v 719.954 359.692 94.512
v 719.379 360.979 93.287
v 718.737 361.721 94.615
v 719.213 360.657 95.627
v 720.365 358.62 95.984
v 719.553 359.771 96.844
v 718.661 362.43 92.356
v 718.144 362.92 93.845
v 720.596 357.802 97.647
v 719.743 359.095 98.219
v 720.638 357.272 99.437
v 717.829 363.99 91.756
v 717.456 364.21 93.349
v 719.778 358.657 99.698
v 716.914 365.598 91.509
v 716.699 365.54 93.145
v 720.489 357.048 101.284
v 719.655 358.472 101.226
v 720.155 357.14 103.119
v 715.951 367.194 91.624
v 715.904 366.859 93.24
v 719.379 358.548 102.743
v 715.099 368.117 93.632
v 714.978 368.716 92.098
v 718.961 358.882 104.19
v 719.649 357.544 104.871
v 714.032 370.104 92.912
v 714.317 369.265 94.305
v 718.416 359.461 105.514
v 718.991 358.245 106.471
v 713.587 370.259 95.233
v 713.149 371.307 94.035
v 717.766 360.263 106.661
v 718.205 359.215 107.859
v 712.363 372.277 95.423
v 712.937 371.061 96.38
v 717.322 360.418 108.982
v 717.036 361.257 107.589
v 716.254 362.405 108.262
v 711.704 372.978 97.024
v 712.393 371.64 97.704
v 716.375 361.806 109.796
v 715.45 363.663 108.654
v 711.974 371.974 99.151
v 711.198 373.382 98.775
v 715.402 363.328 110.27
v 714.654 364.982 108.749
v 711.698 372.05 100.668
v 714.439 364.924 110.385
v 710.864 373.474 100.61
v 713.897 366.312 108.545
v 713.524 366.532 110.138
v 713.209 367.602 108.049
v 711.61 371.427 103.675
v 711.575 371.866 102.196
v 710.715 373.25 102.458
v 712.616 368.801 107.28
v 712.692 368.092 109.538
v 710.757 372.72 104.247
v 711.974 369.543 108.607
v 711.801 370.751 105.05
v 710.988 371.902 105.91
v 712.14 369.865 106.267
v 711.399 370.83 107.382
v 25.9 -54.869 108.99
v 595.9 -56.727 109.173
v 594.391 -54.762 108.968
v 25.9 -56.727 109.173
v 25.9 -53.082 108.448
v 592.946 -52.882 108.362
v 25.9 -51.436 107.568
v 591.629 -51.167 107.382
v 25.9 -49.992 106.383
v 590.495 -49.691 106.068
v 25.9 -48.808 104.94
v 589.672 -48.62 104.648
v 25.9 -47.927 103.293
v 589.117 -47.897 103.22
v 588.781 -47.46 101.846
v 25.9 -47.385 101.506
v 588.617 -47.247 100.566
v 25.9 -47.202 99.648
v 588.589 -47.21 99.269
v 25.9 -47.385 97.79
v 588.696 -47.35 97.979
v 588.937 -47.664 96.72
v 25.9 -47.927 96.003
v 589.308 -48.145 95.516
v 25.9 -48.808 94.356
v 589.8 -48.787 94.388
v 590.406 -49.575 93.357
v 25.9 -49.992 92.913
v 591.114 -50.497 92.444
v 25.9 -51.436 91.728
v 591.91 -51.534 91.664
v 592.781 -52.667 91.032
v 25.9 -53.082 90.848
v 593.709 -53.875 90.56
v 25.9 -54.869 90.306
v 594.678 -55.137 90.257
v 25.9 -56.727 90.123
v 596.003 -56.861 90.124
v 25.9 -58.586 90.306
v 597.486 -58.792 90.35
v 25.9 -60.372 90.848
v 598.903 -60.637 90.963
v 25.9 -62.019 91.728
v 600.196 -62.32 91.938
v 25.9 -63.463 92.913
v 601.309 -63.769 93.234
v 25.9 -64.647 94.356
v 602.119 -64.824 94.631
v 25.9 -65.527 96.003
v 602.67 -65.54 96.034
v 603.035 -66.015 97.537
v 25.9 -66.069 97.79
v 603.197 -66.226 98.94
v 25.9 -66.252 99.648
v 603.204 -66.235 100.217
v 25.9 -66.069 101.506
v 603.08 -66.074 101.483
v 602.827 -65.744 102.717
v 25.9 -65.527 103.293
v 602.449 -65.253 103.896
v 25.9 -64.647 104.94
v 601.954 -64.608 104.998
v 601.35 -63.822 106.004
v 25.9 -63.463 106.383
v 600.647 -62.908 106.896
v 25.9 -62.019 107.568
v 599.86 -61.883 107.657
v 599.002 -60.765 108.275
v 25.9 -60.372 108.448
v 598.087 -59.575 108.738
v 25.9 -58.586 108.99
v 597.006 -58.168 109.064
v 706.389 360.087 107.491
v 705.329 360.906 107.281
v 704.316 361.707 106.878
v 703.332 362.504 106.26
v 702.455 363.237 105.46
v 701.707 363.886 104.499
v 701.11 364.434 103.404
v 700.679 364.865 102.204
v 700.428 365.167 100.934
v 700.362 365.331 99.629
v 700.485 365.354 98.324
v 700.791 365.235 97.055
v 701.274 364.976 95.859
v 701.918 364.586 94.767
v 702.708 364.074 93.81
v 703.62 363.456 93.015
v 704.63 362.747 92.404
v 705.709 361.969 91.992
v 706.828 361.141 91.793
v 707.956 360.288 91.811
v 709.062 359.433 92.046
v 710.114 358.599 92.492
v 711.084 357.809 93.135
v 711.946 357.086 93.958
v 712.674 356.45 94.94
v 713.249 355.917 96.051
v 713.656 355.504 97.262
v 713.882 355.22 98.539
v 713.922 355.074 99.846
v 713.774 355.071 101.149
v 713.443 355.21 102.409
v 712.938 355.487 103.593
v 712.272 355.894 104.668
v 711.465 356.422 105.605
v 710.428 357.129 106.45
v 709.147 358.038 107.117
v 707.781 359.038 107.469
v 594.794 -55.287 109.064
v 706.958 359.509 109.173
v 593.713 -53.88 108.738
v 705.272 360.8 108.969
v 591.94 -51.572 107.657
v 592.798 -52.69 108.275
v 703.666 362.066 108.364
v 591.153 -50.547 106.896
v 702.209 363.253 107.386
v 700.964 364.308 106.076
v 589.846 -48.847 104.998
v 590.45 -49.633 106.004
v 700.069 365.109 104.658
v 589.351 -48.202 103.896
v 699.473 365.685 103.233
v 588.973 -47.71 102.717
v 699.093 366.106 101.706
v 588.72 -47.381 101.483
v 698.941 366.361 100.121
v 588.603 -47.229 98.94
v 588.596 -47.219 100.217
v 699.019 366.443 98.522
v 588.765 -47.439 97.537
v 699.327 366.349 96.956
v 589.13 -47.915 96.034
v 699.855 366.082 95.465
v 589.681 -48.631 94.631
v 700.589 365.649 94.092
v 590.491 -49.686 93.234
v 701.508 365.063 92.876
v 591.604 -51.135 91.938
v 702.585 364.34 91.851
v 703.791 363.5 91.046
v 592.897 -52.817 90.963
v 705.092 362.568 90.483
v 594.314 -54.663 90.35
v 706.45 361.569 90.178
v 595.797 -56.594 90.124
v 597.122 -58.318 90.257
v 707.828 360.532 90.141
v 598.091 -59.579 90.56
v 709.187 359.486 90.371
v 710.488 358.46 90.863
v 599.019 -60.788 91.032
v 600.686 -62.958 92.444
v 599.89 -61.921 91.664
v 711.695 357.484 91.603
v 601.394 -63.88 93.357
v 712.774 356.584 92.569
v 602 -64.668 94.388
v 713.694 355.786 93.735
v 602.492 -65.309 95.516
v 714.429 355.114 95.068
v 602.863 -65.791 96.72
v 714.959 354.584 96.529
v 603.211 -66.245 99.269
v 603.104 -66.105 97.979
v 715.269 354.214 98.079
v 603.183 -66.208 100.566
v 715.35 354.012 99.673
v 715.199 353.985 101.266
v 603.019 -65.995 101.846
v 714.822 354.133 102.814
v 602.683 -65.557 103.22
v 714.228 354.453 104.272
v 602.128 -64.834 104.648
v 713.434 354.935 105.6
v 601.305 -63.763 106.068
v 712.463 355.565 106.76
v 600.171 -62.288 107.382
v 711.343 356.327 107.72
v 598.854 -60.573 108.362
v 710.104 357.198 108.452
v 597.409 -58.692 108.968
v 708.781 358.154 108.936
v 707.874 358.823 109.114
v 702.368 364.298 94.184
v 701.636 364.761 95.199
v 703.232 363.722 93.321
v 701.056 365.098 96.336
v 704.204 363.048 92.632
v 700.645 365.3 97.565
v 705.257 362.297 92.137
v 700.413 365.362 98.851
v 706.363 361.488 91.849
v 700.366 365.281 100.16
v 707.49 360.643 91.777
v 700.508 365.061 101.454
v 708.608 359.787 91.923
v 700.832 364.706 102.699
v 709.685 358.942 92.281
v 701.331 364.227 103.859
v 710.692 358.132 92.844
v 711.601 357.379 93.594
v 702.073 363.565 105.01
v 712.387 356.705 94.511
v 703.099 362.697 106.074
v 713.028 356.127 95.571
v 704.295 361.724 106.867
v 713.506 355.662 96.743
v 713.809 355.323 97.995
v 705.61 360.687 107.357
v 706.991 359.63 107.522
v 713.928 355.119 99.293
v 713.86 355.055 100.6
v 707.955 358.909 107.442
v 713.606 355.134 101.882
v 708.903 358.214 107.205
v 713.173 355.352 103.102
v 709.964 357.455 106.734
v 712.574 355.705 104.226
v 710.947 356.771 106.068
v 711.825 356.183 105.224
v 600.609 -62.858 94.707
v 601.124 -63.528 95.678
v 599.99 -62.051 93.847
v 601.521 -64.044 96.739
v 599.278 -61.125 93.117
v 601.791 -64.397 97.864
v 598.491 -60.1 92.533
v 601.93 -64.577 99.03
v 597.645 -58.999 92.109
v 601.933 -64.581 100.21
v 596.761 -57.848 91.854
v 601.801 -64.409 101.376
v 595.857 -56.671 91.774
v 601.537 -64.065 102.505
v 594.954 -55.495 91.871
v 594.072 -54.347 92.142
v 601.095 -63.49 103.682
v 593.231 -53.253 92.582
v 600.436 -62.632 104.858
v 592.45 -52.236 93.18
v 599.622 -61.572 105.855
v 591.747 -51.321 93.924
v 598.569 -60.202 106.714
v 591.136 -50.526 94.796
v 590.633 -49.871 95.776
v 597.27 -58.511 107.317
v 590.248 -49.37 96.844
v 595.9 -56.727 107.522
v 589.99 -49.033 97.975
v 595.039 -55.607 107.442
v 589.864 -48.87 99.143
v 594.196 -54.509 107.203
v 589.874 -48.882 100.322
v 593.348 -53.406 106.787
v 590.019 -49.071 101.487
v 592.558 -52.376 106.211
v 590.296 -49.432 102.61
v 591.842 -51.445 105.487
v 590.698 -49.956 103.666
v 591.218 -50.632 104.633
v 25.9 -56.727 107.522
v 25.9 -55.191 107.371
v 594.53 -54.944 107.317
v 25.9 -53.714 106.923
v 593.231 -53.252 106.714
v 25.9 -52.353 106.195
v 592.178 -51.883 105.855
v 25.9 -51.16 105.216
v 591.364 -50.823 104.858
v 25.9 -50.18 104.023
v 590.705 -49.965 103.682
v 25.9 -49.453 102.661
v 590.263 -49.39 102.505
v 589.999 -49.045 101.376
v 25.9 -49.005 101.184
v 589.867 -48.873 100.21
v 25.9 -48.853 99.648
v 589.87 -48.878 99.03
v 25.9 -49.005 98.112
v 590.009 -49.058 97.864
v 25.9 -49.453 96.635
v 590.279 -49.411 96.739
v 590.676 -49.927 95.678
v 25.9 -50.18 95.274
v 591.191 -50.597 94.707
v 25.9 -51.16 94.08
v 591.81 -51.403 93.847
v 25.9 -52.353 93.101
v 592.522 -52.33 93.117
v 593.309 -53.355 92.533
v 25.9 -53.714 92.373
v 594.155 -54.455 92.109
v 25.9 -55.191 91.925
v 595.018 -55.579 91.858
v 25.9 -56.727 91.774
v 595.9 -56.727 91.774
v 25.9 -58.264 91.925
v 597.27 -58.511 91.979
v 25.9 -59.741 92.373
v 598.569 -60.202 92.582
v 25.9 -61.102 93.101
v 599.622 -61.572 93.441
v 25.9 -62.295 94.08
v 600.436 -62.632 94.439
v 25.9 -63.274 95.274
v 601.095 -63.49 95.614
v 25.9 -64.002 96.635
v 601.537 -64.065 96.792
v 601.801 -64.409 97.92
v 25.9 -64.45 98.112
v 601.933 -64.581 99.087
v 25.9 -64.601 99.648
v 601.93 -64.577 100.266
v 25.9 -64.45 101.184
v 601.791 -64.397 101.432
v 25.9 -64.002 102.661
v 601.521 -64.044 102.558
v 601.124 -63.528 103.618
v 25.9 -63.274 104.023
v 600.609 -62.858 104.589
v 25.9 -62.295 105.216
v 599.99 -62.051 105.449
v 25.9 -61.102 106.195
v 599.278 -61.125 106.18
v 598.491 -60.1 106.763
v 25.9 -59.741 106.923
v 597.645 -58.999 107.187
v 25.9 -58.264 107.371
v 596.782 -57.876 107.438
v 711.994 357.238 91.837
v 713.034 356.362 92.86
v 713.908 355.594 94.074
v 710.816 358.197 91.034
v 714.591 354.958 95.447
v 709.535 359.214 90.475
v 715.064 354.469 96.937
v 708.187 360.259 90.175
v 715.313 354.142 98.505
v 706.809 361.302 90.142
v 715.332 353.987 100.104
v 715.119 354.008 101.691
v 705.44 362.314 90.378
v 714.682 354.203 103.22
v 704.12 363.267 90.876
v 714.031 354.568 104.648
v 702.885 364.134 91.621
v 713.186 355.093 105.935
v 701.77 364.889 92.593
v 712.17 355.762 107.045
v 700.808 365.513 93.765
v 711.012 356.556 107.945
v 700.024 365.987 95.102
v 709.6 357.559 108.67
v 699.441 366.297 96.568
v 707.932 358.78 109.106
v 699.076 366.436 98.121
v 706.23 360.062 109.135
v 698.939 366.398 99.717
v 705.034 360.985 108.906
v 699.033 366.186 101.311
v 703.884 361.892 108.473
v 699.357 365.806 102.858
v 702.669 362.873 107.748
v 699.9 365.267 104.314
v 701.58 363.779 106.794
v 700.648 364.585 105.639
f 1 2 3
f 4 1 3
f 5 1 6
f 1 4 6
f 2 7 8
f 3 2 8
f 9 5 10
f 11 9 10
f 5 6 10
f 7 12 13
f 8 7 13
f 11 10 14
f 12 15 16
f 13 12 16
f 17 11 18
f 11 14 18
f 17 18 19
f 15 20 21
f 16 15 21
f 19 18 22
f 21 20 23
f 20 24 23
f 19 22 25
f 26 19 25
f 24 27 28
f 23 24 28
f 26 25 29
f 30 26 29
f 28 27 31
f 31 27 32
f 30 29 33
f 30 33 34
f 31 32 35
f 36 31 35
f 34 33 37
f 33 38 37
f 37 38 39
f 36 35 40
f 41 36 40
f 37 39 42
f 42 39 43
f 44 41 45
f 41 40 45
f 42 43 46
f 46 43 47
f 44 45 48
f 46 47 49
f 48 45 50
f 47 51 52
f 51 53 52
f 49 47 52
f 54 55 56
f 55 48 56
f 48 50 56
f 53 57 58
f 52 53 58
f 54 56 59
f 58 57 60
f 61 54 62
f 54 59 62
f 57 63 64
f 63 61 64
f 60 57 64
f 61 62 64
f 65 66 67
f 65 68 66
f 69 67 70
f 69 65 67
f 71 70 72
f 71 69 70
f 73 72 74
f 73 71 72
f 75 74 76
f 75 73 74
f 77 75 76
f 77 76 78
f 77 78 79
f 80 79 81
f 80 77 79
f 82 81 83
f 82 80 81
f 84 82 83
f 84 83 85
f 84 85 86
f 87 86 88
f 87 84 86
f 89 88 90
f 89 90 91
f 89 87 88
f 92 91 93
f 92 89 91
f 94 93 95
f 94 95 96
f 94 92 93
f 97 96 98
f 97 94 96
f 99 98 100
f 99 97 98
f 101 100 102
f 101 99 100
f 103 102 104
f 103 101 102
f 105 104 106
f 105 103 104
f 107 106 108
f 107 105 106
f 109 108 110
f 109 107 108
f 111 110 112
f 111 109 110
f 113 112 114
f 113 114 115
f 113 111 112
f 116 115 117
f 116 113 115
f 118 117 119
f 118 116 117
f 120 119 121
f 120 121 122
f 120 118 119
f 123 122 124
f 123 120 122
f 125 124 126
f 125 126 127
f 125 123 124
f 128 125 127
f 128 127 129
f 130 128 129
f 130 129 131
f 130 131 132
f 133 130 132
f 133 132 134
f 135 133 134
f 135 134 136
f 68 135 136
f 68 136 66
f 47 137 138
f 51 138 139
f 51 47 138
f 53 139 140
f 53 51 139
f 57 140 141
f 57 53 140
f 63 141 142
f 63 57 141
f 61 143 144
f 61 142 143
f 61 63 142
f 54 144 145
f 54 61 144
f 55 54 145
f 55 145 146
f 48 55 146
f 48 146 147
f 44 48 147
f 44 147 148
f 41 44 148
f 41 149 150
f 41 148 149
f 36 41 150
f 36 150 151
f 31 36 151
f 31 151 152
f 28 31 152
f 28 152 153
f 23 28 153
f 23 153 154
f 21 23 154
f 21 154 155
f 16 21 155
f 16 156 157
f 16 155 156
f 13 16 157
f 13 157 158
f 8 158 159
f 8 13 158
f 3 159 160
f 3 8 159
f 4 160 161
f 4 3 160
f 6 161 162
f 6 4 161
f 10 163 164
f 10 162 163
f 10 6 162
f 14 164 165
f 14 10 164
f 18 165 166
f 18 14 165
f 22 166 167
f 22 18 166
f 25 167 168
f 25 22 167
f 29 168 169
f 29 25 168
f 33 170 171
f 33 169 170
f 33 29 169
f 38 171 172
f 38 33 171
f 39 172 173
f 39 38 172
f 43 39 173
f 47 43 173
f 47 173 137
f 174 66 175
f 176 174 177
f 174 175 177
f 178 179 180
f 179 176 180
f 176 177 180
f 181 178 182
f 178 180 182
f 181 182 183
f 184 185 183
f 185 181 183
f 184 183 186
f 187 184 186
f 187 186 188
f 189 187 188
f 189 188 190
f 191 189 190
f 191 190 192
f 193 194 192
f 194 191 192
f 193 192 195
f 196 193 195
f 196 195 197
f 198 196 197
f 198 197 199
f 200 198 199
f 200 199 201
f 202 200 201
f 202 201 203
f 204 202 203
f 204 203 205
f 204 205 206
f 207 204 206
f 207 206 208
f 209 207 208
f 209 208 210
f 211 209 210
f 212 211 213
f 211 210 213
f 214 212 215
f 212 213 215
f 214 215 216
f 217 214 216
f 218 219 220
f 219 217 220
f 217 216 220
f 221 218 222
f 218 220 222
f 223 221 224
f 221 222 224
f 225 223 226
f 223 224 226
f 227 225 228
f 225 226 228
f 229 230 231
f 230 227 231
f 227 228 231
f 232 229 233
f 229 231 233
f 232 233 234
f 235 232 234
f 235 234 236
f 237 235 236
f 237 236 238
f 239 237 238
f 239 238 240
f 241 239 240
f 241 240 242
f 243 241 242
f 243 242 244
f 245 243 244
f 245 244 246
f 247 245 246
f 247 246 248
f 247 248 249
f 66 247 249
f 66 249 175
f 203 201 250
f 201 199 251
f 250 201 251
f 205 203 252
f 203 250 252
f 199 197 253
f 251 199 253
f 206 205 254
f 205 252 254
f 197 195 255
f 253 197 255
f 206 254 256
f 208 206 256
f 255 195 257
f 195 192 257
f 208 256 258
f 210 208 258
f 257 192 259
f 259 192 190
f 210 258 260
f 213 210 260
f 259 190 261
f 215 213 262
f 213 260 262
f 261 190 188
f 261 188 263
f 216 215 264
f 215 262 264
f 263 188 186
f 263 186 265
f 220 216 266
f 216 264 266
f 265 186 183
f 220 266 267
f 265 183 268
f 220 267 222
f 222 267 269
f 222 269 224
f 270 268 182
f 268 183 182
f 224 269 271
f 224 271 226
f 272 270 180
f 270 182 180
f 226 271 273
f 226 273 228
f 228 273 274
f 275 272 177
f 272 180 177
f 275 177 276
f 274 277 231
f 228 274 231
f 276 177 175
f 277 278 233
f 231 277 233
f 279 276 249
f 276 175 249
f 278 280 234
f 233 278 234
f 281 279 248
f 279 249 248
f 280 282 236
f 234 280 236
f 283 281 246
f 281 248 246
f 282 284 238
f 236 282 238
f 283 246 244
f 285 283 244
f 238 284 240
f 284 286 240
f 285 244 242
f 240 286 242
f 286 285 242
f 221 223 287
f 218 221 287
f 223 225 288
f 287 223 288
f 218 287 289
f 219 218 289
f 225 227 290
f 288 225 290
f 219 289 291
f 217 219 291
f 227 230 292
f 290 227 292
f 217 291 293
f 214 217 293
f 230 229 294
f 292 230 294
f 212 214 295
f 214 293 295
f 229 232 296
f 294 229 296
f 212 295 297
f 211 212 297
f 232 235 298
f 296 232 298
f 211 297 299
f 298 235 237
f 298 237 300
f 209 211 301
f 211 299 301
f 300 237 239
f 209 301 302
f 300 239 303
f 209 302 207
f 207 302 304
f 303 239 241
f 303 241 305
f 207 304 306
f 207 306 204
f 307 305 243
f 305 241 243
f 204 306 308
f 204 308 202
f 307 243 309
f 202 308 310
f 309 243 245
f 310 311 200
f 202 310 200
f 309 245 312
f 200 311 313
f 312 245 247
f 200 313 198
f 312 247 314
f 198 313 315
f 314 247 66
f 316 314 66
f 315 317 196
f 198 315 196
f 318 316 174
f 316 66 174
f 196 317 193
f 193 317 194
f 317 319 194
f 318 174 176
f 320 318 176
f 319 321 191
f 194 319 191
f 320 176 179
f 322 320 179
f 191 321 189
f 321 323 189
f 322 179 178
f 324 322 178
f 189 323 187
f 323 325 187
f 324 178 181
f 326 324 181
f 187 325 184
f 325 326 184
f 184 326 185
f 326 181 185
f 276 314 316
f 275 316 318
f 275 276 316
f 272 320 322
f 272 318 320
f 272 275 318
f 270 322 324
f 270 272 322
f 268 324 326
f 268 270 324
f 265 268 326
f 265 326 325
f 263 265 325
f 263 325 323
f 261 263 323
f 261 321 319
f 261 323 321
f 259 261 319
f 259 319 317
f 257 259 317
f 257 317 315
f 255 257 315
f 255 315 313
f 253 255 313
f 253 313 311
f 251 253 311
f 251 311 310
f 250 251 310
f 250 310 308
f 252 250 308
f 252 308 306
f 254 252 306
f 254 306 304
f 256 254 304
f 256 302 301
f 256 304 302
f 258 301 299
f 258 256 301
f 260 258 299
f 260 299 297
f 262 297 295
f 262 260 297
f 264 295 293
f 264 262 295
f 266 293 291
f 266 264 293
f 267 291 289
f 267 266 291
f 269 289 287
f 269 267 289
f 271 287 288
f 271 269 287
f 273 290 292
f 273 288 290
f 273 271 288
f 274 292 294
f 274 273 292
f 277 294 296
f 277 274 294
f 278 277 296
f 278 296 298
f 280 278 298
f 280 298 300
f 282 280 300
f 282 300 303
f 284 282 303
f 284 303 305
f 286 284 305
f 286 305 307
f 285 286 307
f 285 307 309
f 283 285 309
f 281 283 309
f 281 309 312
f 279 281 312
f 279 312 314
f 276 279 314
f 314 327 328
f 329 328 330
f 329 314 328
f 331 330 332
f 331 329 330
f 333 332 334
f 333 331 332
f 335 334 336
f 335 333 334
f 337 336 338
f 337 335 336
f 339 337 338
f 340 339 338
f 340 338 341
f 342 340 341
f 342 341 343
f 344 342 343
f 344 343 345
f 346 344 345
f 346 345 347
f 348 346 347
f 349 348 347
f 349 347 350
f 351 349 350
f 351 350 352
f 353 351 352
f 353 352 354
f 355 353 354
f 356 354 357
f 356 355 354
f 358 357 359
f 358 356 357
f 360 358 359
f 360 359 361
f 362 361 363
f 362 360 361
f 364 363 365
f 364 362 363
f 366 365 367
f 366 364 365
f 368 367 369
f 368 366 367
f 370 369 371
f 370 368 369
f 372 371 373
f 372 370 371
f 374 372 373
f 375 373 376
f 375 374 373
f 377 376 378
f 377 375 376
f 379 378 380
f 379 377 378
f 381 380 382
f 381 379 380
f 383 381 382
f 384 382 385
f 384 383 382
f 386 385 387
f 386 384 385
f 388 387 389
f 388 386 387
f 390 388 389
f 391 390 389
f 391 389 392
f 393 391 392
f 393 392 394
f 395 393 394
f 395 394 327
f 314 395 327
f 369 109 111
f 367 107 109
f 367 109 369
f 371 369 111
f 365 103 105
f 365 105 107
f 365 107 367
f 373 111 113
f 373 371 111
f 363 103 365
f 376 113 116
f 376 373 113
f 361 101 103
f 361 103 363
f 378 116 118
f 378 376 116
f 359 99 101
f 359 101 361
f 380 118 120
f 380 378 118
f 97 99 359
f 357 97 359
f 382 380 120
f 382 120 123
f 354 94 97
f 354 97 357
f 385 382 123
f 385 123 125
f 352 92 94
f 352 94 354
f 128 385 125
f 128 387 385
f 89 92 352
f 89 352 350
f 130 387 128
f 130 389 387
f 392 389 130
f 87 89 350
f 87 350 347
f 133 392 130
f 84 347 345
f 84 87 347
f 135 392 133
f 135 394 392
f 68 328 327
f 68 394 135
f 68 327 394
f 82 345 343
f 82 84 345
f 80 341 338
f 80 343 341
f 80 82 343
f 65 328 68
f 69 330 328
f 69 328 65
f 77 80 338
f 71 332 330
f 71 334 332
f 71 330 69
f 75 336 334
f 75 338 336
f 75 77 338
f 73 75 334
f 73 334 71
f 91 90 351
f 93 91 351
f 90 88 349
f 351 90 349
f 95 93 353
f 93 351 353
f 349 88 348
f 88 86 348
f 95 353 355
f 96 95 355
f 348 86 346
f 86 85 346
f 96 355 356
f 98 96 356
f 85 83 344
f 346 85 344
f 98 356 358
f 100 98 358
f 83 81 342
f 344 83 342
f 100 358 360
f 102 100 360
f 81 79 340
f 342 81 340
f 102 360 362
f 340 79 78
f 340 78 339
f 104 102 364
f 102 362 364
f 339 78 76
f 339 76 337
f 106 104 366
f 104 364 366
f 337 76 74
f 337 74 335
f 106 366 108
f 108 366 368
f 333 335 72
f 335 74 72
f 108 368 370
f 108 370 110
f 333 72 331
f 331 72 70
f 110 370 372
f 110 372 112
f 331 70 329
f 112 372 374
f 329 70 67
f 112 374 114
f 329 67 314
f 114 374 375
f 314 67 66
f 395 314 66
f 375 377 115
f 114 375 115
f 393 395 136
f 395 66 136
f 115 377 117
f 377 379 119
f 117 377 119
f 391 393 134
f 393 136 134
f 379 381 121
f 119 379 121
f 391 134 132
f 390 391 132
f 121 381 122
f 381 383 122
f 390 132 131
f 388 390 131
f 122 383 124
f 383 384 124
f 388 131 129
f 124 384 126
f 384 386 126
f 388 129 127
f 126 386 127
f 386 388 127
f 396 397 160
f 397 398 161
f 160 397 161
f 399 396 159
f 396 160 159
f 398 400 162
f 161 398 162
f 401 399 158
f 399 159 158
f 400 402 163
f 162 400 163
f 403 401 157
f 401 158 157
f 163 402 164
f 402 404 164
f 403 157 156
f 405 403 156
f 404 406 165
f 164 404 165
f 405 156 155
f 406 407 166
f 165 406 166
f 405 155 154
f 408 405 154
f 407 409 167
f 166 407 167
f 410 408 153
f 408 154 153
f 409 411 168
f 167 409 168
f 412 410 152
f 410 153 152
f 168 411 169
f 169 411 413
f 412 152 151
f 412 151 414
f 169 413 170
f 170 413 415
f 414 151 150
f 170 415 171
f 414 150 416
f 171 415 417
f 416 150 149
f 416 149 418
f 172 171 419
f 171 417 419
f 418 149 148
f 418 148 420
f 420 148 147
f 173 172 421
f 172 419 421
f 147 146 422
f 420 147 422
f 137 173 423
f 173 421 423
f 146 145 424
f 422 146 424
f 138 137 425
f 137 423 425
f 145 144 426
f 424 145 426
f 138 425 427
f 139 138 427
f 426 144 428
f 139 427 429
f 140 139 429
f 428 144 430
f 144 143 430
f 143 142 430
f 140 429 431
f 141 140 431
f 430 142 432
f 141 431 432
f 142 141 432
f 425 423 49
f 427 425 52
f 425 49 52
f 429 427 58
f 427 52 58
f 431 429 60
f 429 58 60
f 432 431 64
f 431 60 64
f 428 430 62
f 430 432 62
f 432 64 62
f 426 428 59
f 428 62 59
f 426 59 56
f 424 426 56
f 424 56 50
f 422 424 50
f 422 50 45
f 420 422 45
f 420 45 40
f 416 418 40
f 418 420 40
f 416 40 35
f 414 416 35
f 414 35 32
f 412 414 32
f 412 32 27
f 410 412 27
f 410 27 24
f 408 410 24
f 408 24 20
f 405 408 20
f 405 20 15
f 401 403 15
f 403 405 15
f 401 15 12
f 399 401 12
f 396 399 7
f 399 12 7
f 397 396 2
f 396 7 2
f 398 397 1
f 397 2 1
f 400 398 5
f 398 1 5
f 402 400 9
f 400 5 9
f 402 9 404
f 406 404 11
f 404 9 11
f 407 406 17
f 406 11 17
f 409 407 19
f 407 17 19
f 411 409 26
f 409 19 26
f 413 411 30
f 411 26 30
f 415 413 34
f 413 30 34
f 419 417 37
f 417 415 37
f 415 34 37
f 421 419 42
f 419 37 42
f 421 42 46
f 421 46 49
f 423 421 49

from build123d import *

# Parameters (mm, degrees)
SKETCH1_ON_SEGMENT_1_R                           = 9.525
SKETCH1_ON_SEGMENT_1_R_2                         = 7.874
AL_ROUND_TUBING_AL_RND_TUBE_0_75_OD_X_0_DEPTH    = 16.568525489
SKETCH1_ON_SEGMENT_2_R                           = 9.525
SKETCH1_ON_SEGMENT_2_R_2                         = 7.874
AL_ROUND_TUBING_AL_RND_TUBE_0_75_OD_3_DEPTH      = 449.437929737
SKETCH1_R                                        = 9.525
SKETCH1_R_2                                      = 7.874
AL_ROUND_TUBING_AL_RND_TUBE_0_75_OD_5_DEPTH      = 570
AL_ROUND_TUBING_AL_RND_TUBE_0_75_OD_5_DEPTH_BACK = 11.347512999


with BuildPart() as part:
    # Sketch1 on segment 1 (carried to segment 1) → Al round tubing AL RND TUBE 0.75 OD X 0.065 WALL(1) (new body)
    with BuildSketch(Plane(origin=(715.67660278, 365.261024414, 100.947050286), x_dir=(-0.129892659, -0.035413668, 0.990895438), z_dir=(-0.853148239, -0.505238537, -0.129892659))):
        Circle(SKETCH1_ON_SEGMENT_1_R)
        Circle(SKETCH1_ON_SEGMENT_1_R_2, mode=Mode.SUBTRACT)
    extrude(amount=AL_ROUND_TUBING_AL_RND_TUBE_0_75_OD_X_0_DEPTH)

    # Al round tubing AL RND TUBE 0.75 OD  2
    split(bisect_by=Plane(origin=(707.14512039, 360.208639043, 99.648123697), x_dir=(-0.798077917, 0.602554262, 0), z_dir=(0.601064457, 0.796104684, 0.070276955)), keep=Keep.TOP)


with BuildPart() as body_2:
    # Sketch1 on segment 2 (carried to segment 2) → Al round tubing AL RND TUBE 0.75 OD  3 (new body)
    with BuildSketch(Plane(origin=(708.838467642, 366.555142189, 99.648123697), x_dir=(0, 0, 1), z_dir=(-0.257797165, -0.966199059, 0))):
        Circle(SKETCH1_ON_SEGMENT_2_R)
        Circle(SKETCH1_ON_SEGMENT_2_R_2, mode=Mode.SUBTRACT)
    extrude(amount=AL_ROUND_TUBING_AL_RND_TUBE_0_75_OD_3_DEPTH)

    # Al round tubing AL RND TUBE 0.75 OD 3 mi
    split(bisect_by=Plane(origin=(707.14512039, 360.208639043, 99.648123697), x_dir=(0.798077917, -0.602554262, 0), z_dir=(-0.601064457, -0.796104684, -0.070276955)), keep=Keep.TOP)

    # Al round tubing AL RND TUBE 0.75 OD  4
    split(bisect_by=Plane(origin=(595.9, -56.727406192, 99.648123697), x_dir=(-0.60918094, 0.793031262, 0), z_dir=(0.793031262, 0.60918094, 0)), keep=Keep.TOP)


with BuildPart() as body_3:
    # Sketch1 → Al round tubing AL RND TUBE 0.75 OD  5 (new, two sides)
    with BuildSketch(Plane(origin=(595.9, -56.727406192, 99.648123697), x_dir=(0, 0, 1), z_dir=(-1, 0, 0))) as al_round_tubing_al_rnd_tube_0_75_od_5_sk:
        Circle(SKETCH1_R)
        Circle(SKETCH1_R_2, mode=Mode.SUBTRACT)
    extrude(amount=AL_ROUND_TUBING_AL_RND_TUBE_0_75_OD_5_DEPTH)
    extrude(al_round_tubing_al_rnd_tube_0_75_od_5_sk.sketch, amount=-AL_ROUND_TUBING_AL_RND_TUBE_0_75_OD_5_DEPTH_BACK)

    # Al round tubing AL RND TUBE 0.75 OD 5 mi
    split(bisect_by=Plane(origin=(595.9, -56.727406192, 99.648123697), x_dir=(0.60918094, -0.793031262, 0), z_dir=(-0.793031262, -0.60918094, 0)), keep=Keep.TOP)


solid = Compound([part.part, body_2.part, body_3.part])
